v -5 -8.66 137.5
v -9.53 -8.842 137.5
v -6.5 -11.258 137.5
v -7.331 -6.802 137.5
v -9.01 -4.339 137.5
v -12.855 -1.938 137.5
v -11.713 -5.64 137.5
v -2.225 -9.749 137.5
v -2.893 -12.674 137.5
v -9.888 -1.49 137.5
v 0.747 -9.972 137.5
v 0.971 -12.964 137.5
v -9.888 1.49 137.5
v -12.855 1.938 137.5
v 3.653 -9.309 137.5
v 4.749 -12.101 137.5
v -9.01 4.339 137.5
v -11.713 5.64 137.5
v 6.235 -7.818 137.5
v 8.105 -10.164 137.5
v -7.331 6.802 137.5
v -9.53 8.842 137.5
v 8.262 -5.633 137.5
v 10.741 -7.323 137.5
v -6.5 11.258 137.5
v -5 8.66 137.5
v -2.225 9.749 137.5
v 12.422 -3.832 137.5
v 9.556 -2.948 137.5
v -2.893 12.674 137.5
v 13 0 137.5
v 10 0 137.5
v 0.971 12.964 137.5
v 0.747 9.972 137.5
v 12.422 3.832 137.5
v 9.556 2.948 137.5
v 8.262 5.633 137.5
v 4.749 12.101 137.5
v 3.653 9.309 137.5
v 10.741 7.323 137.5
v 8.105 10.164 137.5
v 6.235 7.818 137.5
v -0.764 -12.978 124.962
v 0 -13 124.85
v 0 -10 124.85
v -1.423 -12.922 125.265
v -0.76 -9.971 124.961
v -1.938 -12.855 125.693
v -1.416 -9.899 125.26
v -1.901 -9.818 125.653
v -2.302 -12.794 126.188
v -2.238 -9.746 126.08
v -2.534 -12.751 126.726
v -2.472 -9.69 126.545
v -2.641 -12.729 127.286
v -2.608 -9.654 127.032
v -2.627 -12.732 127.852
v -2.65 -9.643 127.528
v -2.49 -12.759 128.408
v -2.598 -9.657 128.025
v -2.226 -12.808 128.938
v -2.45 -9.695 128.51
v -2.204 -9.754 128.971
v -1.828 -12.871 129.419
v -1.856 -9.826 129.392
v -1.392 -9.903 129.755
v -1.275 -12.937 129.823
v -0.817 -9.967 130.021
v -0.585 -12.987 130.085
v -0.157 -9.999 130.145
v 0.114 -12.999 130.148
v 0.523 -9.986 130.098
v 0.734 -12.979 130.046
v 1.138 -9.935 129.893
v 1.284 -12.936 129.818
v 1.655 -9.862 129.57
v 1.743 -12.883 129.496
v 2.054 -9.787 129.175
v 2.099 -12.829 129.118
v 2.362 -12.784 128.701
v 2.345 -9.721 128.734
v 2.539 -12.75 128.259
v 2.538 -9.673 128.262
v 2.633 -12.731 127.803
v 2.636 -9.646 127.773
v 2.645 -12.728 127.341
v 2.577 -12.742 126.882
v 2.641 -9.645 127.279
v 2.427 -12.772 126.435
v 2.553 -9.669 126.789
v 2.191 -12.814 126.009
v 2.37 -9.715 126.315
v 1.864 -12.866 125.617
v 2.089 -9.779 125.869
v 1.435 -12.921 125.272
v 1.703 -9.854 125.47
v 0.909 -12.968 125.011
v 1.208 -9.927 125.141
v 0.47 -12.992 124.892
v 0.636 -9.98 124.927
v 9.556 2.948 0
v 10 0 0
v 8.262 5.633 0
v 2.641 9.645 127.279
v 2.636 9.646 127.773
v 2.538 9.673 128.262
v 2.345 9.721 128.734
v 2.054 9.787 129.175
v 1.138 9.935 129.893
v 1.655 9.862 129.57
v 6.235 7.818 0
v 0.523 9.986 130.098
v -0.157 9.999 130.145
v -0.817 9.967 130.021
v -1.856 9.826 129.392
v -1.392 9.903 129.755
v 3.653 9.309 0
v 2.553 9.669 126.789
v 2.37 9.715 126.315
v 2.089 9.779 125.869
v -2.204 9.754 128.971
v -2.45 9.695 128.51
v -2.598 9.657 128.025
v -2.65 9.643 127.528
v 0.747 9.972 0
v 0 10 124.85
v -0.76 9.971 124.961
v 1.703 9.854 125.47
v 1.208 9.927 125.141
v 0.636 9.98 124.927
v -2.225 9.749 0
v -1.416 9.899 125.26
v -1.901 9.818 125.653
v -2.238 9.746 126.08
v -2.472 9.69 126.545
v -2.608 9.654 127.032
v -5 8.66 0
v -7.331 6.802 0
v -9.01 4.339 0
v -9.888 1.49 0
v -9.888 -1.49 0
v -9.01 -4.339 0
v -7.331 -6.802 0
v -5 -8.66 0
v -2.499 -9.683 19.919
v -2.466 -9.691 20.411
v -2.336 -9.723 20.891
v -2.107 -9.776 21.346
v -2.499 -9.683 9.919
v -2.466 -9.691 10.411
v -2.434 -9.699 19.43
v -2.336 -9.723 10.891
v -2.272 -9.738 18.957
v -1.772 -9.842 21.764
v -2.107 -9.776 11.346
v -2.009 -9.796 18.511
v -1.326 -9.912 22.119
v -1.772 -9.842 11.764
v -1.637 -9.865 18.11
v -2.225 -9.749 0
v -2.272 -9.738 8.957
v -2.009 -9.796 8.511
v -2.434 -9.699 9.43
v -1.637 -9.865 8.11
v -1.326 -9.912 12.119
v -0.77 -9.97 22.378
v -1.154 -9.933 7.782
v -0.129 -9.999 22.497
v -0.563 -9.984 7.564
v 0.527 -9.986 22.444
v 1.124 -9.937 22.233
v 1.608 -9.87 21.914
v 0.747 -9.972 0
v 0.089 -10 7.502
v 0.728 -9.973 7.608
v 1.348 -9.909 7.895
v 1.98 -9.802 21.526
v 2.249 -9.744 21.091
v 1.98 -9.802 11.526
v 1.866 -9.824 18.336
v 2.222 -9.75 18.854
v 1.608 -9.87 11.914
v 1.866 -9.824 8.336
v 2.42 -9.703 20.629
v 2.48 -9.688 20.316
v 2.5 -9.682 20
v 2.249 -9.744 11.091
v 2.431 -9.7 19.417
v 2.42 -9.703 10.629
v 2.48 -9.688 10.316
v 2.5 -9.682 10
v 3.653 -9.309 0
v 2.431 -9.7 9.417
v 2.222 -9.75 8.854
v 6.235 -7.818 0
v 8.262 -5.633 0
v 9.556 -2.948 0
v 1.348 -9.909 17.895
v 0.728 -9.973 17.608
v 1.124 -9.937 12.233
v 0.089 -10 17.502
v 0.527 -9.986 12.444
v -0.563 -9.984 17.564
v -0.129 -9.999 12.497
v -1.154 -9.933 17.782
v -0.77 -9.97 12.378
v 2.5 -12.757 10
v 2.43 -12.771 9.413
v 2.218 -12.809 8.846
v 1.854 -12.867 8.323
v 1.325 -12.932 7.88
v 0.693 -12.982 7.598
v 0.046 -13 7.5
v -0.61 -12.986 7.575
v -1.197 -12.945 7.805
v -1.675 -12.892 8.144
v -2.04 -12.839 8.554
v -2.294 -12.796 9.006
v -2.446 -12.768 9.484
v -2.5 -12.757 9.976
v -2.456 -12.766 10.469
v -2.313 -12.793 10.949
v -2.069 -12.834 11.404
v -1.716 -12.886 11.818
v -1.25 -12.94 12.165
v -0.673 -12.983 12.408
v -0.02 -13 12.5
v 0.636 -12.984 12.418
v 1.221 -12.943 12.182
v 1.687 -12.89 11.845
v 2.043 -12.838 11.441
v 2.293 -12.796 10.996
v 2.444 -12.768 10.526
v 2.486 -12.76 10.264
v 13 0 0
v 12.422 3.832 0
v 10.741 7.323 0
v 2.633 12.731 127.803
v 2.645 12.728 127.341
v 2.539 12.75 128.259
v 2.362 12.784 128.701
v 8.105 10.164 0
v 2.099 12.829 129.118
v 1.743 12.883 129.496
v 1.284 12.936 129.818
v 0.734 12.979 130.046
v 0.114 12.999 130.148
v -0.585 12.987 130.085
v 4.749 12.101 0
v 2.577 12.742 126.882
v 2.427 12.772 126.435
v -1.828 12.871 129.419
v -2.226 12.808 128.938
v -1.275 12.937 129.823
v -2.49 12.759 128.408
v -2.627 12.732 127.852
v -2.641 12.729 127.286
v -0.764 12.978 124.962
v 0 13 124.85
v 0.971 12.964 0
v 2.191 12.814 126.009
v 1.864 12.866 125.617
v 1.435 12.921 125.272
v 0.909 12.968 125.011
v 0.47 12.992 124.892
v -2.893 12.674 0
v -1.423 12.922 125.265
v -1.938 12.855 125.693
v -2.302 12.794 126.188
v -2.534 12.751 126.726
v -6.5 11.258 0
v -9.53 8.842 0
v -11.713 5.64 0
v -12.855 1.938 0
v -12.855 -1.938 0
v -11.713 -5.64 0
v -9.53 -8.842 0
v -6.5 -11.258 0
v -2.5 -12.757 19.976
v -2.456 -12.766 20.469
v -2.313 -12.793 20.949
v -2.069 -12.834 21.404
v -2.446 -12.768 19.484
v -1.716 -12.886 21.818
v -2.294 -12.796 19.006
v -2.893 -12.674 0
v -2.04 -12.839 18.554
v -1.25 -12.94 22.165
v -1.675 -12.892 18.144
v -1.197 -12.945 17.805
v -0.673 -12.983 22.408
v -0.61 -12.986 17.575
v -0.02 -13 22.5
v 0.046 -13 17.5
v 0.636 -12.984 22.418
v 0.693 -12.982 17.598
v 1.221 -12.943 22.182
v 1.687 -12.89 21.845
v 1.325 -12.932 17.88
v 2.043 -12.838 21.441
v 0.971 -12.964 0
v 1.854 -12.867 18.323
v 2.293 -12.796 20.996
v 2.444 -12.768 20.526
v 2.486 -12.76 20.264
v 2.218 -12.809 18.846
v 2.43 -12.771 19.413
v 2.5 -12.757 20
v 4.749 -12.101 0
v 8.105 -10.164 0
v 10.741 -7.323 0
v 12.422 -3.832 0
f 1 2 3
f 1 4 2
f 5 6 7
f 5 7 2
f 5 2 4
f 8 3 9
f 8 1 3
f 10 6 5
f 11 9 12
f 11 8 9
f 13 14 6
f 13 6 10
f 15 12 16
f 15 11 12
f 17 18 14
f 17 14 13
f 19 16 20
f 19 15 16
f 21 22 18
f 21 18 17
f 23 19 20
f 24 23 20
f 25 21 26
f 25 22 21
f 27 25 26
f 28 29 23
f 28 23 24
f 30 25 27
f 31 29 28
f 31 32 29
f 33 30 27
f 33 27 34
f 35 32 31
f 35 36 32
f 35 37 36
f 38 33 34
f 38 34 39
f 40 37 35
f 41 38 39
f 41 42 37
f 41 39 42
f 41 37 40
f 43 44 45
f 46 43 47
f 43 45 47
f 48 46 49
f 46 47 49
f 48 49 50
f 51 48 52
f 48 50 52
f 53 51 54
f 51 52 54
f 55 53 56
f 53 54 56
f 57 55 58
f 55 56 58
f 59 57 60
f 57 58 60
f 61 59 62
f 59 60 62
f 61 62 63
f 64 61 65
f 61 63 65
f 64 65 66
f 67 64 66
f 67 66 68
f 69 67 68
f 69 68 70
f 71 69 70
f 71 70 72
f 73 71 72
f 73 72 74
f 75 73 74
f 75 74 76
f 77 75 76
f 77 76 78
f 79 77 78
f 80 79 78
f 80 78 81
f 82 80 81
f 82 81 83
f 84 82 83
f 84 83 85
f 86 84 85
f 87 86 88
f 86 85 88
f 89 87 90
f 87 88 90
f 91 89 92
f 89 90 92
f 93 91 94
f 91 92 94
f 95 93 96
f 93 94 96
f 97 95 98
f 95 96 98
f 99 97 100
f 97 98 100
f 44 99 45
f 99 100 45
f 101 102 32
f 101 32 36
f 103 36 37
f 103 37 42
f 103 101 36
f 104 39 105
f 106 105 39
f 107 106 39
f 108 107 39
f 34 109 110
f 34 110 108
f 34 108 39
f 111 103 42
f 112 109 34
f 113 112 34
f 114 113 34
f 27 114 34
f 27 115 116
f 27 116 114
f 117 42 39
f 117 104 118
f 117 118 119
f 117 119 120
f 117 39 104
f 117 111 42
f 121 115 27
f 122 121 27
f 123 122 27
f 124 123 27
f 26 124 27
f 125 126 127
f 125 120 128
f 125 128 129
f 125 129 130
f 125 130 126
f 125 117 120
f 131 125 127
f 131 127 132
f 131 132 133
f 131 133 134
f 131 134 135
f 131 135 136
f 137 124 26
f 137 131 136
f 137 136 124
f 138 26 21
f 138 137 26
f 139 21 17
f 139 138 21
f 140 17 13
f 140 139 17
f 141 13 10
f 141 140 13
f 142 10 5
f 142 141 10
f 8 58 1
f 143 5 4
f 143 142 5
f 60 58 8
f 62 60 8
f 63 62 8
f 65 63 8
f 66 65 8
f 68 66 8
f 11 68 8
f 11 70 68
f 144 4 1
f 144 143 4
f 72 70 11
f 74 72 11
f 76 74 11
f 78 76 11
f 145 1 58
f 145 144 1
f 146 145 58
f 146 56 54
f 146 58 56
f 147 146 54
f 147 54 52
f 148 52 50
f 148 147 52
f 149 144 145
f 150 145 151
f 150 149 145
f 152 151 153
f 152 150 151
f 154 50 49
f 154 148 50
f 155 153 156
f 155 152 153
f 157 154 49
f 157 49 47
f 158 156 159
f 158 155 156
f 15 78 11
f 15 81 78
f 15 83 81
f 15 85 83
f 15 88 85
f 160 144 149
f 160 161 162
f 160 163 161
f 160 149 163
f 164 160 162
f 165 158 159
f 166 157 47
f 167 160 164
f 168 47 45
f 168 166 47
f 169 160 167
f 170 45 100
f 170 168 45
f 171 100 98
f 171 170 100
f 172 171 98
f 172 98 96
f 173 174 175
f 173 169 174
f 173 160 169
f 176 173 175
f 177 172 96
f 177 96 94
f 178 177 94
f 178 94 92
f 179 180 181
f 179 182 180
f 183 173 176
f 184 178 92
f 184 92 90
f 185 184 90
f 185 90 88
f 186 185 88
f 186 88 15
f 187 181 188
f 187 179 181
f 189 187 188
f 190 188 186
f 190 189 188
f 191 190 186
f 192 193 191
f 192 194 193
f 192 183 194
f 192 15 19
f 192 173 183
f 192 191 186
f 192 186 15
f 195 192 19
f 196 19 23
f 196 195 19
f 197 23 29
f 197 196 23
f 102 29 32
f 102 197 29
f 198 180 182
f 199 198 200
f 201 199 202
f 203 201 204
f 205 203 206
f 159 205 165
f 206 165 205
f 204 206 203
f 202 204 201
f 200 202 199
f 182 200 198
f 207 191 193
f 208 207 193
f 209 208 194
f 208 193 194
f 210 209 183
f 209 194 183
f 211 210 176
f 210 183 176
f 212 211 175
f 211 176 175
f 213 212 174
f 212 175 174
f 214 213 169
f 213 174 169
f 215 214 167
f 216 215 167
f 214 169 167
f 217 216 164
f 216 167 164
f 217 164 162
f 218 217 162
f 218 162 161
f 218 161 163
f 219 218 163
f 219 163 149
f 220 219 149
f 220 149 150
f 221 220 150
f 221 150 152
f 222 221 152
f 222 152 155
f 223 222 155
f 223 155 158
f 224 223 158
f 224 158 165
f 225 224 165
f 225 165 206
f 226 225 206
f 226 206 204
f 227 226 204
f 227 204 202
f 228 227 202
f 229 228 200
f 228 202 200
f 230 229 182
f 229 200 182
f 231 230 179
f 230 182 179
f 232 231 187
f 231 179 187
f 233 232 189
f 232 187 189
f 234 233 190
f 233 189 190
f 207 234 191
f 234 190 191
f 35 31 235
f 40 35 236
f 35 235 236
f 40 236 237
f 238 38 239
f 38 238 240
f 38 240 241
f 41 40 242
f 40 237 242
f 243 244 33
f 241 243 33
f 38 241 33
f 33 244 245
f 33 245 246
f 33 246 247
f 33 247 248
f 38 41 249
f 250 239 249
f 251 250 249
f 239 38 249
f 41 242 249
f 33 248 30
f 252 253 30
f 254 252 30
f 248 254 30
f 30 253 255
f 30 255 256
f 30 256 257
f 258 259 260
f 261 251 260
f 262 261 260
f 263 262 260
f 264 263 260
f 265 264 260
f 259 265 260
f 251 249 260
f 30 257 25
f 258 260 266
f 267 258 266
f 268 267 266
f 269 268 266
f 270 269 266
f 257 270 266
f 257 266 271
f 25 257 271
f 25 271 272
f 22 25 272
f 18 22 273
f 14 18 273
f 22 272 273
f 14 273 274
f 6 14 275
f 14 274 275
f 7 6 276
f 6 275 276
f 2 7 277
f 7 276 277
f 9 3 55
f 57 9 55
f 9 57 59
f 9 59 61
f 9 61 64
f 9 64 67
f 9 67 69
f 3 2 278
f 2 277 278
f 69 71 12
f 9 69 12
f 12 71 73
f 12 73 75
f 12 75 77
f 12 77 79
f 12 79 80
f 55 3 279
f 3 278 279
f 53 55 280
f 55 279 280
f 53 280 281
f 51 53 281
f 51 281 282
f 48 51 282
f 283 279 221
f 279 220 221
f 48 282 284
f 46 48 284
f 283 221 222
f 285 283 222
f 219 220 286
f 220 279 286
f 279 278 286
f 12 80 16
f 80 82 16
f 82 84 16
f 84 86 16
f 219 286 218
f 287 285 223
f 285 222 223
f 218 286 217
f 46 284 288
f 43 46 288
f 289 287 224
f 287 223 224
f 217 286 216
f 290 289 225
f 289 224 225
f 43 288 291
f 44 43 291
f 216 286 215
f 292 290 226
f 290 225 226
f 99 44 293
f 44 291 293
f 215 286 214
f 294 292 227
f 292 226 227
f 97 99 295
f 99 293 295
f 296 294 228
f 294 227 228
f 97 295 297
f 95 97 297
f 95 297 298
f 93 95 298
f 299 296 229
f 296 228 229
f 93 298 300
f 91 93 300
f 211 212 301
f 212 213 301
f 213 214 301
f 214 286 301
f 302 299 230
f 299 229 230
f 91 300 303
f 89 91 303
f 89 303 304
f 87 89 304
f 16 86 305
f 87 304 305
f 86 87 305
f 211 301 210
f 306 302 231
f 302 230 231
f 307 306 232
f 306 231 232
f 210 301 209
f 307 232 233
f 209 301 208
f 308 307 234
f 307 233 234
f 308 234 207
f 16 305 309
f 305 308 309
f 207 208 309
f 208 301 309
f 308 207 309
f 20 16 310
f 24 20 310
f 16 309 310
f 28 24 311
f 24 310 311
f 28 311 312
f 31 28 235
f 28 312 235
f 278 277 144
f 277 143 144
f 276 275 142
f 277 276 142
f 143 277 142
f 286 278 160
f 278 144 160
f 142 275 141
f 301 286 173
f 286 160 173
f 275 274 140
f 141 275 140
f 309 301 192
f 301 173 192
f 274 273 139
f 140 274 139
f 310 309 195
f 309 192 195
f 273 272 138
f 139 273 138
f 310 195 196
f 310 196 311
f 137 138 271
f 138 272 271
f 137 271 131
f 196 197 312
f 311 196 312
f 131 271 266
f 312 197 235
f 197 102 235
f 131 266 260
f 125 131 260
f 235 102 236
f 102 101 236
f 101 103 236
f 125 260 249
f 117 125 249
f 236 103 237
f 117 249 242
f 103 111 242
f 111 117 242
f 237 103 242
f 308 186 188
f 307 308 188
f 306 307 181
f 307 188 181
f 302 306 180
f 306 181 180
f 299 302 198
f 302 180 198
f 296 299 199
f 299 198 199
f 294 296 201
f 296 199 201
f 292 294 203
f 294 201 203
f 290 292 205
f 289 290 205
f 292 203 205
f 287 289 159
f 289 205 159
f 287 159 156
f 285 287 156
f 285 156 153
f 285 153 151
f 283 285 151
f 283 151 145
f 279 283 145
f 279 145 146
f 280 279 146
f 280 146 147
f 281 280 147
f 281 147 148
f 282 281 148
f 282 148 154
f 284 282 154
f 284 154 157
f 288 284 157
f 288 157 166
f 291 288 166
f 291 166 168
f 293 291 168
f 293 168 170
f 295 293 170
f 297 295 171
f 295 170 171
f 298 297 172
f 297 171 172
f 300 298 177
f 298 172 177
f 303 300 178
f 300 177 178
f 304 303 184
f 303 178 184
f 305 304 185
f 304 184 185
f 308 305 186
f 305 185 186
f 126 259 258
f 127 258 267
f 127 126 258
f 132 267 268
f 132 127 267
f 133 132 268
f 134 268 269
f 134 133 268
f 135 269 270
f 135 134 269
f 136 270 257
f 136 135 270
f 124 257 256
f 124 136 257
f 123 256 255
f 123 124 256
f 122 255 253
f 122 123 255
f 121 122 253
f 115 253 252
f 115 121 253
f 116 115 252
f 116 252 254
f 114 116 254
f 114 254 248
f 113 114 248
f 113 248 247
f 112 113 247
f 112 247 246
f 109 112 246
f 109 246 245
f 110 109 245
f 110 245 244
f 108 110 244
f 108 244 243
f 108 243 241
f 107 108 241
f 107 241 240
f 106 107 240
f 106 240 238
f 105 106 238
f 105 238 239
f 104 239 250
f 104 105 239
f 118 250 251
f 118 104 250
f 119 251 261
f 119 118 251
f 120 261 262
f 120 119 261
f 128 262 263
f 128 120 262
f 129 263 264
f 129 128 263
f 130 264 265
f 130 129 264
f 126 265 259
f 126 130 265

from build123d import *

# Parameters (mm, degrees)
SKETCH1_R               = 13
SKETCH1_R_2             = 10
BOSS_EXTRUDE1_DEPTH     = 137.5
SKETCH3_R               = 2.5
CUT_EXTRUDE1_DEPTH      = 139.723646146
CUT_EXTRUDE2_DEPTH      = 150
CUT_EXTRUDE2_DEPTH_BACK = 139.723646264
SKETCH4_R               = 2.65


with BuildPart() as part:
    # Sketch1 → Boss-Extrude1 (new body)
    with BuildSketch(Plane.XY):
        Circle(SKETCH1_R)
        Circle(SKETCH1_R_2, mode=Mode.SUBTRACT)
    extrude(amount=BOSS_EXTRUDE1_DEPTH)

    # Sketch3 → Cut-Extrude1 (cut, through all)
    with BuildSketch(Plane(origin=(0, 0, 0), x_dir=(1, 0, 0), z_dir=(0, 1, 0))):
        with Locations((0, -10)):
            Circle(SKETCH3_R)
        with Locations((0, -20)):
            Circle(SKETCH3_R)
    extrude(amount=-CUT_EXTRUDE1_DEPTH, mode=Mode.SUBTRACT)

    # Sketch4 → Cut-Extrude2 (cut, two sides: drawn at the far end of the back side and taken through both)
    with BuildSketch(Plane(origin=(0, 0, 0), x_dir=(0, 0, -1), z_dir=(0, 1, 0)).offset(-CUT_EXTRUDE2_DEPTH_BACK)):
        with Locations((-127.5, 0)):
            Circle(SKETCH4_R)
    extrude(amount=CUT_EXTRUDE2_DEPTH + CUT_EXTRUDE2_DEPTH_BACK, mode=Mode.SUBTRACT)


solid = part.part
